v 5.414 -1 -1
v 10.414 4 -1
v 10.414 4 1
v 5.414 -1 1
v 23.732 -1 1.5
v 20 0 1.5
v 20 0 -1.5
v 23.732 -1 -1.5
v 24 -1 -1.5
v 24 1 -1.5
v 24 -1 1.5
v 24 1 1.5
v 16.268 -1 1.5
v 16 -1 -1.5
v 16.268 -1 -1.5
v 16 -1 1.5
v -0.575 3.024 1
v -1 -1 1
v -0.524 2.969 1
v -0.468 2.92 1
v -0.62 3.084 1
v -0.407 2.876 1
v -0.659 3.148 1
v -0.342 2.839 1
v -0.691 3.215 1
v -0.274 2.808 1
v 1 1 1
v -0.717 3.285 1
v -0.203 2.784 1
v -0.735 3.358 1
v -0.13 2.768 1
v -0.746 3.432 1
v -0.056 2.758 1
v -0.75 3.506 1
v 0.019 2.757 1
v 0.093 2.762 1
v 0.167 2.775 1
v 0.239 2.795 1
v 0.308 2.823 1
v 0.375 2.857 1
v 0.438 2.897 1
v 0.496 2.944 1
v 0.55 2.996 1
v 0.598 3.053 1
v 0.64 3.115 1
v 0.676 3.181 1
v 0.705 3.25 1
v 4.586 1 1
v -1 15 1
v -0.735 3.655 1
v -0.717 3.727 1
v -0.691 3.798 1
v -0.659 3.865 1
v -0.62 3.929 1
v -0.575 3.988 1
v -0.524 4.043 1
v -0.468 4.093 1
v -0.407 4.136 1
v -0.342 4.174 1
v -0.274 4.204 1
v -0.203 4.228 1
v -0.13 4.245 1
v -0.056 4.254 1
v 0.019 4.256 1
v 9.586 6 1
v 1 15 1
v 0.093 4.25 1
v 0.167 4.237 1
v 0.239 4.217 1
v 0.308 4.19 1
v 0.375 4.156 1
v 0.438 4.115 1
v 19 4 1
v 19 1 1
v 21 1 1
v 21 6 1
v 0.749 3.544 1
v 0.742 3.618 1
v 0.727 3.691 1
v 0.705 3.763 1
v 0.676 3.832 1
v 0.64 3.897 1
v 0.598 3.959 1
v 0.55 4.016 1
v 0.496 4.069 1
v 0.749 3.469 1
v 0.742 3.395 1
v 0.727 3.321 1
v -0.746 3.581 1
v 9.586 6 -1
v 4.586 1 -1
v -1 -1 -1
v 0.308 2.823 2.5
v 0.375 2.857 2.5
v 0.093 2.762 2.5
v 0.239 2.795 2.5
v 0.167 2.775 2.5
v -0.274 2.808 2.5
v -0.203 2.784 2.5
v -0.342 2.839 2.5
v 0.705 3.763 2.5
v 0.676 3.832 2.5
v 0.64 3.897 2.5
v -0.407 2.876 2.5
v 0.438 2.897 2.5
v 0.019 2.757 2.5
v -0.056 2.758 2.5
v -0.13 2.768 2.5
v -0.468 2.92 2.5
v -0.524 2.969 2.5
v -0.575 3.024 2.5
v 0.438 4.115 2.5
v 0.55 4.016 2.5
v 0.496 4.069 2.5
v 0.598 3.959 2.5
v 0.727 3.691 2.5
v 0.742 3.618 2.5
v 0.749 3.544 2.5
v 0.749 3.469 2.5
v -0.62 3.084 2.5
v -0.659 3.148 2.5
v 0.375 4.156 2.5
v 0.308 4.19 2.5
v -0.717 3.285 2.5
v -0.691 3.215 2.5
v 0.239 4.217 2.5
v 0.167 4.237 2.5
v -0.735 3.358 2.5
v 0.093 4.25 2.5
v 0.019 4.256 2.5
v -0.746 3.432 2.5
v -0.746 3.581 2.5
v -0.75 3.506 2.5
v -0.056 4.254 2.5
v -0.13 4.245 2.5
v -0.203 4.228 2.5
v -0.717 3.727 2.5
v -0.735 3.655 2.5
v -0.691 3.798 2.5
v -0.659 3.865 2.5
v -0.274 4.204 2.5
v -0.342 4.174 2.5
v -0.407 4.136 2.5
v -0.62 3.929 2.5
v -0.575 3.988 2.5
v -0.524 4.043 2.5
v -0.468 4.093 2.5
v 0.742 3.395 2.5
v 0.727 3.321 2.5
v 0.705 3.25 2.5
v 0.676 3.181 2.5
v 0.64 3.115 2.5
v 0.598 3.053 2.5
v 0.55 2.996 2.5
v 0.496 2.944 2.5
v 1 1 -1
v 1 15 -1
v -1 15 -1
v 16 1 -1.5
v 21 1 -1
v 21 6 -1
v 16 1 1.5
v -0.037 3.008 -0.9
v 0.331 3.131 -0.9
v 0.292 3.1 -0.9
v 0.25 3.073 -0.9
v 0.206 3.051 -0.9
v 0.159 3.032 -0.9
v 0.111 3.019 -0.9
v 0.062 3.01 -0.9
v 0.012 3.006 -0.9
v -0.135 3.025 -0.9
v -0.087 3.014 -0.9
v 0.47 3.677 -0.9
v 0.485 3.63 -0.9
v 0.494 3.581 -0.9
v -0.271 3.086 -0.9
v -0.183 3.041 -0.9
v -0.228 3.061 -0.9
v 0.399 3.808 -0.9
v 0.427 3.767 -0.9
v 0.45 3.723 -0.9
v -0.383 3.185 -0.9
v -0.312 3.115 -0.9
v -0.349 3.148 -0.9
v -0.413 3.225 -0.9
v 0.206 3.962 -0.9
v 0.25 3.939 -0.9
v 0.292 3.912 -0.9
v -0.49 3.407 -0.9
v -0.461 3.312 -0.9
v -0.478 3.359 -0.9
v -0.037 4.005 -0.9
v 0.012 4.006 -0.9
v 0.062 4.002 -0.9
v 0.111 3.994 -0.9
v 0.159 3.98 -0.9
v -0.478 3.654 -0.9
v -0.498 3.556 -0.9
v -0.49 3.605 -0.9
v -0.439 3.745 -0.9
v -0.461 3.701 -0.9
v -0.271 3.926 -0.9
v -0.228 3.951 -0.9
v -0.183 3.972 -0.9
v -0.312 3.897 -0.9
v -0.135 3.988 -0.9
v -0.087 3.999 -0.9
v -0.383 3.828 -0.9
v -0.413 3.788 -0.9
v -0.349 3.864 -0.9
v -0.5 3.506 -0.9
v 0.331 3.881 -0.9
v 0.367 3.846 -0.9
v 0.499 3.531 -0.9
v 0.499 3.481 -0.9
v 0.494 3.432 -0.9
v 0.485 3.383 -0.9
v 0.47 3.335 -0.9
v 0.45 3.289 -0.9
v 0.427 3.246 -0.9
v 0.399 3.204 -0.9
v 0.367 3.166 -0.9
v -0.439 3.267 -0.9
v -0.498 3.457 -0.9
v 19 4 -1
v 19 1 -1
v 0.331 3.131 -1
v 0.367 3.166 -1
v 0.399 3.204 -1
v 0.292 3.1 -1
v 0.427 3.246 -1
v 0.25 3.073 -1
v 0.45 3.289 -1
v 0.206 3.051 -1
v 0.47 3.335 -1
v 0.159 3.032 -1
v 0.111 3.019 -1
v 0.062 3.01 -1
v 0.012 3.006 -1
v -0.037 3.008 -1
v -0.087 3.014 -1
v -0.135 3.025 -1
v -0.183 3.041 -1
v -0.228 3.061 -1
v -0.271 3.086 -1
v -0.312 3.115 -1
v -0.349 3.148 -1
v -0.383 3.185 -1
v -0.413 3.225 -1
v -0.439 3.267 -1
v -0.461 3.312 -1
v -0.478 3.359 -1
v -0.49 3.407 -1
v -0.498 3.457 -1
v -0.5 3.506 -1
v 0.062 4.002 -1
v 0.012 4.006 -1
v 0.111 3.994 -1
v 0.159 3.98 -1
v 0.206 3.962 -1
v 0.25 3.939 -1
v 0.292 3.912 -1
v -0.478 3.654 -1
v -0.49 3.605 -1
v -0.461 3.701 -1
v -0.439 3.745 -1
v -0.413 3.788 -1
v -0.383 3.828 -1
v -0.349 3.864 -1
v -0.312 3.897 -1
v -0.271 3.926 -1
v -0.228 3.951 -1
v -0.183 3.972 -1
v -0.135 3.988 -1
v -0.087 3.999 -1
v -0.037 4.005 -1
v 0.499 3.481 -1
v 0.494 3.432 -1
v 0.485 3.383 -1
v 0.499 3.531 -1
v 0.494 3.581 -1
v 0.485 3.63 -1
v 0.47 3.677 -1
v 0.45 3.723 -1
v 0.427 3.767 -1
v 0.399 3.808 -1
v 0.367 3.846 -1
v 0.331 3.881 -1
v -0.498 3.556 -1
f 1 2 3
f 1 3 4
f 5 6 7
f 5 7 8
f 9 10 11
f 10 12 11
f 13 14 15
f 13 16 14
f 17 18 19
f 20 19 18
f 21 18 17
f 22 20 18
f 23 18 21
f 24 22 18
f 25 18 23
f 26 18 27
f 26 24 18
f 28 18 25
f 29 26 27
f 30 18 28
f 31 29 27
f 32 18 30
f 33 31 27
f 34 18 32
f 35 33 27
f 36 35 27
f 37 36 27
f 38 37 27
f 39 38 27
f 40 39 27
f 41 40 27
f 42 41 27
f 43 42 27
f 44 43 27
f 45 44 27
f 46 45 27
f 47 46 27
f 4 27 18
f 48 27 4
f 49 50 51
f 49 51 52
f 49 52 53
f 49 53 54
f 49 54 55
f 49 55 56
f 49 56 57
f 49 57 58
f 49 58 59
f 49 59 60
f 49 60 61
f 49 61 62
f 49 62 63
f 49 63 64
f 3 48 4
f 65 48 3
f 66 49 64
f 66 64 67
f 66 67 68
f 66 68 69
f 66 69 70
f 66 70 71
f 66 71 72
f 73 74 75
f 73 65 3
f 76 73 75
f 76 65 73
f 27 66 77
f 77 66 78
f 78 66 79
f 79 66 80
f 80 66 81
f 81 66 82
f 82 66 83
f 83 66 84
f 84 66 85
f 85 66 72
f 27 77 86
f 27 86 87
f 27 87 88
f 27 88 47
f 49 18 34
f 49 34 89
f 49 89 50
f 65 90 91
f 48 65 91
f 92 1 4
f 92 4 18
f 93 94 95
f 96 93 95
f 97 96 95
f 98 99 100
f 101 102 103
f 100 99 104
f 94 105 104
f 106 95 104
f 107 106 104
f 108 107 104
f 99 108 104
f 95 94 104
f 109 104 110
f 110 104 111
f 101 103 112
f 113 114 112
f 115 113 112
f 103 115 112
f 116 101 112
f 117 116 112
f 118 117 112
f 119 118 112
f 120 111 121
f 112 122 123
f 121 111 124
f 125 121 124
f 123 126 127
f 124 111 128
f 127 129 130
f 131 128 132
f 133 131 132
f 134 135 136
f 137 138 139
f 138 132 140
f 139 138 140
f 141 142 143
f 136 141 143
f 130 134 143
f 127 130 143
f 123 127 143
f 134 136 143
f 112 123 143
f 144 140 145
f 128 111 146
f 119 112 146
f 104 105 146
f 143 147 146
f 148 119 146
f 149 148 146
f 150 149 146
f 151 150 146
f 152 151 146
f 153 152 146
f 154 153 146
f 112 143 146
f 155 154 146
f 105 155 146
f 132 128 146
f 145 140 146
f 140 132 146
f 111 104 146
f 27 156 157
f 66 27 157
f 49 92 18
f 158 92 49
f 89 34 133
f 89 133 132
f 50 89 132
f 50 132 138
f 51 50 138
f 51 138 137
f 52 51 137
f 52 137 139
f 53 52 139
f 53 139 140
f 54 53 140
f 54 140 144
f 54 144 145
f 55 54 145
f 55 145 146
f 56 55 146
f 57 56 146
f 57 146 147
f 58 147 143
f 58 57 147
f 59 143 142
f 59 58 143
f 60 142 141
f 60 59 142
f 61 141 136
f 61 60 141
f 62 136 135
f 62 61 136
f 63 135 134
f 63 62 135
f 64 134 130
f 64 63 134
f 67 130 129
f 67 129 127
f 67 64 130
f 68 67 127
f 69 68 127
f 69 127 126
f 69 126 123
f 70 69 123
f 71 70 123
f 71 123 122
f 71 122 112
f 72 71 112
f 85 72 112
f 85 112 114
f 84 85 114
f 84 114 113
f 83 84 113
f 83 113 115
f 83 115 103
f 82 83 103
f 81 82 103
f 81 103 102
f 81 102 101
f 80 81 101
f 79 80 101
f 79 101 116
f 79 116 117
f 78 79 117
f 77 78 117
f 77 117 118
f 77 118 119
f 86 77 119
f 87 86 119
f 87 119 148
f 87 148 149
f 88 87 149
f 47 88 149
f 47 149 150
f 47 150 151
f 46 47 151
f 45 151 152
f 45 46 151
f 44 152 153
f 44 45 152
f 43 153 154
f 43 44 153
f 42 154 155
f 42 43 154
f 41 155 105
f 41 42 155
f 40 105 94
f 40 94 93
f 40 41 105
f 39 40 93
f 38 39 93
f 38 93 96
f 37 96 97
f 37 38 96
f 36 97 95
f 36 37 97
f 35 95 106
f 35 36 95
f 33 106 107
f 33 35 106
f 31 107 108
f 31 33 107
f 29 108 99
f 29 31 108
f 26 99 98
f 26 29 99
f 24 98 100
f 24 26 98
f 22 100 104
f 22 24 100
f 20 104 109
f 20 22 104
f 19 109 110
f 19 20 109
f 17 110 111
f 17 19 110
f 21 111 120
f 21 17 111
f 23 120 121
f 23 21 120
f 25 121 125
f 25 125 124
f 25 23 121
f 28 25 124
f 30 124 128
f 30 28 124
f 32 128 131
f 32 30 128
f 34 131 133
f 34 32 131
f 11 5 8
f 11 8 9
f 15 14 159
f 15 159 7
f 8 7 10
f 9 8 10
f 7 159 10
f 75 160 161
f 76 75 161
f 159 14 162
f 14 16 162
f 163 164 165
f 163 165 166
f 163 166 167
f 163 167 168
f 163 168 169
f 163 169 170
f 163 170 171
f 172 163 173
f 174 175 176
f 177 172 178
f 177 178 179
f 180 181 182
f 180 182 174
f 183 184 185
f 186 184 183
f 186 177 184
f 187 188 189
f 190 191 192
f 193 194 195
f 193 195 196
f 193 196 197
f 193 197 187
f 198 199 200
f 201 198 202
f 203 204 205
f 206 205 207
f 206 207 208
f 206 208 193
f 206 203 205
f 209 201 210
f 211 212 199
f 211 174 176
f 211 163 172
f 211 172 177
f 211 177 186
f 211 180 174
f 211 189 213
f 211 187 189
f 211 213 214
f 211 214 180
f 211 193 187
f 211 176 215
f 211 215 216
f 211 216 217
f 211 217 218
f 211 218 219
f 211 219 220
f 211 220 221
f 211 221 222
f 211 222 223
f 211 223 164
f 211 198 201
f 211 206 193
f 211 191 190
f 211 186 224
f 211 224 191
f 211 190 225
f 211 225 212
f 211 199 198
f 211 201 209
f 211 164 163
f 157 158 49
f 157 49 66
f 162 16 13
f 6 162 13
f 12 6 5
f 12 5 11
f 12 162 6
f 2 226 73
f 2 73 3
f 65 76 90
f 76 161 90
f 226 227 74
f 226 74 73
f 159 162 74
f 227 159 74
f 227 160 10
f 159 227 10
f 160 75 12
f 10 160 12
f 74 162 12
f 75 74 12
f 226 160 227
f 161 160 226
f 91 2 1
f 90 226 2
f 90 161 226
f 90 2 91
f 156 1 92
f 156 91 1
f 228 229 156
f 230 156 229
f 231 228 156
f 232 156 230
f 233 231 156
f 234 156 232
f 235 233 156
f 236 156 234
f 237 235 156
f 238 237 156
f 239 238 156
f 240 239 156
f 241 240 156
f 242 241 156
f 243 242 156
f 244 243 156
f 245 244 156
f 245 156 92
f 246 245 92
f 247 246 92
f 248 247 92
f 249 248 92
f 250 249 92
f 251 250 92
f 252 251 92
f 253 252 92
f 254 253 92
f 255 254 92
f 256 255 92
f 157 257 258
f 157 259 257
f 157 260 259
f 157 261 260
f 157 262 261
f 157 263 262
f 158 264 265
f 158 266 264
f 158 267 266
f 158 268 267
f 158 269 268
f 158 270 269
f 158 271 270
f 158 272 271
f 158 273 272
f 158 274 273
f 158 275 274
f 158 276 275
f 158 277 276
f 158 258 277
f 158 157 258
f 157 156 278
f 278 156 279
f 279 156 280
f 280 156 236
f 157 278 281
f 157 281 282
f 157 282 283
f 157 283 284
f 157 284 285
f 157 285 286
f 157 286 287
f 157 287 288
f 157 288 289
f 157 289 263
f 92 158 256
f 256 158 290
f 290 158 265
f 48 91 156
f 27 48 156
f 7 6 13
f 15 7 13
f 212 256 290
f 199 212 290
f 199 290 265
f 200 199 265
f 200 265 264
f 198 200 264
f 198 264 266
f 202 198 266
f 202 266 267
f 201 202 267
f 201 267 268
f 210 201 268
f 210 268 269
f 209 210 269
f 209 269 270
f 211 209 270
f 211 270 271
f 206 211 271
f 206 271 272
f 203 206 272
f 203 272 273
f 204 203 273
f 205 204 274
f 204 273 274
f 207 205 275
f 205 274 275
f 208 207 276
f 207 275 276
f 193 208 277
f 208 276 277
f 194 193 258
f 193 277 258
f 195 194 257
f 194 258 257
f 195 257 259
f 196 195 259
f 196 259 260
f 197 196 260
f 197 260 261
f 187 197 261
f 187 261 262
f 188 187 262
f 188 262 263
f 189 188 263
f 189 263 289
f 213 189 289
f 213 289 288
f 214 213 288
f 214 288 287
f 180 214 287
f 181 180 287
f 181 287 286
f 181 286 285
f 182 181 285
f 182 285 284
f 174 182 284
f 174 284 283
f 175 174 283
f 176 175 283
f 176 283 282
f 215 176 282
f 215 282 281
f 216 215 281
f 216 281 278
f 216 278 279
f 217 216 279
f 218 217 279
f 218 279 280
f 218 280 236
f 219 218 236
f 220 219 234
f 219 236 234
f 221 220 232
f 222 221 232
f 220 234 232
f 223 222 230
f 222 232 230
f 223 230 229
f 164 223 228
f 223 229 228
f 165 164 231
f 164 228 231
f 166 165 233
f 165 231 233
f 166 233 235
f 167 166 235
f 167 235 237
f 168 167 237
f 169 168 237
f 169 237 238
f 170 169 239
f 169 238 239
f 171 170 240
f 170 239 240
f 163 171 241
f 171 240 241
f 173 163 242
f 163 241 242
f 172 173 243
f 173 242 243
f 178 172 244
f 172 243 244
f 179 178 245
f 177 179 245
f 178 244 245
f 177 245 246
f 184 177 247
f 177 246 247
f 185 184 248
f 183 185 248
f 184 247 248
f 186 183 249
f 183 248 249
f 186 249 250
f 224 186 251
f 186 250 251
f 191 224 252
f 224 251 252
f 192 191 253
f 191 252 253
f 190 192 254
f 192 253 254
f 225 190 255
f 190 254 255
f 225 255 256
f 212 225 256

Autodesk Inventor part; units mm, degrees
ref_plane "YZ Plane" through (0, 0, 0) normal (1, 0, 0) x (0, 1, 0)
ref_plane "XZ Plane" through (0, 0, 0) normal (0, 1, 0) x (-1, 0, 0)
ref_plane "XY Plane" through (0, 0, 0) normal (0, 0, 1) x (1, 0, 0)
sketch "Sketch8" plane through (0, 0, 0) normal (0, 0, 1) x (1, 0, 0)
  line L0 (0, 0) -> (0, 15) construction
  line L1 (0, 0) -> (5, 0) construction
  line L2 (5, 0) -> (10, 5) construction
  line L3 (10, 5) -> (20, 5) construction
  line L4 (20, 5) -> (20, 0) construction
  line L5 (21, 0) -> (21, 6)
  line L6 (21, 6) -> (9.5858, 6)
  line L7 (9.5858, 6) -> (4.5858, 1)
  line L8 (4.5858, 1) -> (1, 1)
  line L9 (1, 1) -> (1, 15)
  line L10 (19, 0) -> (19, 4)
  line L11 (19, 4) -> (10.4142, 4)
  line L12 (10.4142, 4) -> (5.4142, -1)
  line L13 (5.4142, -1) -> (-1, -1)
  line L14 (-1, -1) -> (-1, 15)
  line L15 (19, 0) -> (21, 0)
  line L16 (-1, 15) -> (1, 15)
  dimension "d49" = 15
  dimension "d50" = 5
  dimension "d51" = 45
  dimension "d52" = 5
  dimension "d53" = 20
  dimension "d54" = 5
  dimension "d55" = 1
  dimension "d56" = 1
  dimension "d62" = 0
extrude "Extrusion10" add sketch "Sketch8" along normal mid plane 2
sketch "Sketch9" plane through (0, 0, -1) normal (0, 0, -1) x (-1, 0, 0)
  line L0 (1, -1) -> (-5.4142, -1) projected
  line L1 (-1, 15) -> (1, 15) projected
  line L2 (-1, 1) -> (-1, 15) projected
  line L3 (0, 15) -> (0, -1) construction
  circle A0 centre (0, 3.5063) radius 0.75
  dimension "d59" = 1.5
extrude "Extrusion11" add sketch "Sketch9" against normal blind 3.5
sketch "Sketch10" plane through (0, 0, 1) normal (0, 0, 1) x (1, 0, 0)
  line L0 (21, 0) -> (19, 0) projected
  line L1 (19, 0) -> (19, 4) projected
  line L2 (5.4142, -1) -> (24, -1) construction
  line L3 (20, 0) -> (20, -1) construction
  line L4 (24, -1) -> (16, -1) construction
  line L5 (16, -1) -> (16, 1)
  line L6 (16, 1) -> (24, 1)
  line L7 (24, 1) -> (24, -1)
  line L8 (20, 0) -> (16.2679, -1)
  line L9 (20, 0) -> (23.7321, -1)
  line L10 (16, -1) -> (16.2679, -1)
  line L11 (23.7321, -1) -> (24, -1)
  dimension "d63" = 2
  dimension "d64" = 4
  dimension "d65" = 8
  dimension "d66" = 15
extrude "Extrusion12" add sketch "Sketch10" against normal up to surface (2 mm away)
sketch "Sketch11" plane through (0, 0, 0) normal (0, 0, 1) x (1, 0, 0)
  line L0 (21, 6) -> (21, 1) projected
  line L1 (9.5858, 6) -> (21, 6) projected
  line L2 (4.5858, 1) -> (9.5858, 6) projected
  line L3 (1, 1) -> (4.5858, 1) projected
  line L4 (1, 15) -> (1, 1) projected
  line L5 (-1, 15) -> (1, 15) projected
  line L6 (-1, -1) -> (-1, 15) projected
  line L7 (5.4142, -1) -> (-1, -1) projected
  line L8 (10.4142, 4) -> (5.4142, -1) projected
  line L9 (19, 4) -> (10.4142, 4) projected
  line L10 (19, 1) -> (19, 4) projected
  line L11 (19, 1) -> (16, 1) projected
  line L12 (16, 1) -> (16, -1) projected
  line L13 (16, -1) -> (16.2679, -1) projected
  line L14 (16.2679, -1) -> (20, 0) projected
  line L15 (20, 0) -> (23.7321, -1) projected
  line L16 (23.7321, -1) -> (24, -1) projected
  line L17 (24, -1) -> (24, 1) projected
  line L18 (24, 1) -> (21, 1) projected
  line L19 (16, 1) -> (24, 1)
extrude "Extrusion13" add sketch "Sketch11" along normal mid plane 3 contours L18 L17 L16 L15 L14 L13 L12 L11 L19
sketch "Sketch12" plane through (0, 0, -1) normal (0, 0, -1) x (-1, 0, 0)
  circle A0 centre (0, 3.5063) radius 0.75 projected
  circle A1 centre (0, 3.5063) radius 0.75 projected
  circle A2 centre (0, 3.5063) radius 0.5
  dimension "d71" = 1
extrude "Extrusion14" cut sketch "Sketch12" against normal blind 0.1 contours A2
properties part number "SlderC"
